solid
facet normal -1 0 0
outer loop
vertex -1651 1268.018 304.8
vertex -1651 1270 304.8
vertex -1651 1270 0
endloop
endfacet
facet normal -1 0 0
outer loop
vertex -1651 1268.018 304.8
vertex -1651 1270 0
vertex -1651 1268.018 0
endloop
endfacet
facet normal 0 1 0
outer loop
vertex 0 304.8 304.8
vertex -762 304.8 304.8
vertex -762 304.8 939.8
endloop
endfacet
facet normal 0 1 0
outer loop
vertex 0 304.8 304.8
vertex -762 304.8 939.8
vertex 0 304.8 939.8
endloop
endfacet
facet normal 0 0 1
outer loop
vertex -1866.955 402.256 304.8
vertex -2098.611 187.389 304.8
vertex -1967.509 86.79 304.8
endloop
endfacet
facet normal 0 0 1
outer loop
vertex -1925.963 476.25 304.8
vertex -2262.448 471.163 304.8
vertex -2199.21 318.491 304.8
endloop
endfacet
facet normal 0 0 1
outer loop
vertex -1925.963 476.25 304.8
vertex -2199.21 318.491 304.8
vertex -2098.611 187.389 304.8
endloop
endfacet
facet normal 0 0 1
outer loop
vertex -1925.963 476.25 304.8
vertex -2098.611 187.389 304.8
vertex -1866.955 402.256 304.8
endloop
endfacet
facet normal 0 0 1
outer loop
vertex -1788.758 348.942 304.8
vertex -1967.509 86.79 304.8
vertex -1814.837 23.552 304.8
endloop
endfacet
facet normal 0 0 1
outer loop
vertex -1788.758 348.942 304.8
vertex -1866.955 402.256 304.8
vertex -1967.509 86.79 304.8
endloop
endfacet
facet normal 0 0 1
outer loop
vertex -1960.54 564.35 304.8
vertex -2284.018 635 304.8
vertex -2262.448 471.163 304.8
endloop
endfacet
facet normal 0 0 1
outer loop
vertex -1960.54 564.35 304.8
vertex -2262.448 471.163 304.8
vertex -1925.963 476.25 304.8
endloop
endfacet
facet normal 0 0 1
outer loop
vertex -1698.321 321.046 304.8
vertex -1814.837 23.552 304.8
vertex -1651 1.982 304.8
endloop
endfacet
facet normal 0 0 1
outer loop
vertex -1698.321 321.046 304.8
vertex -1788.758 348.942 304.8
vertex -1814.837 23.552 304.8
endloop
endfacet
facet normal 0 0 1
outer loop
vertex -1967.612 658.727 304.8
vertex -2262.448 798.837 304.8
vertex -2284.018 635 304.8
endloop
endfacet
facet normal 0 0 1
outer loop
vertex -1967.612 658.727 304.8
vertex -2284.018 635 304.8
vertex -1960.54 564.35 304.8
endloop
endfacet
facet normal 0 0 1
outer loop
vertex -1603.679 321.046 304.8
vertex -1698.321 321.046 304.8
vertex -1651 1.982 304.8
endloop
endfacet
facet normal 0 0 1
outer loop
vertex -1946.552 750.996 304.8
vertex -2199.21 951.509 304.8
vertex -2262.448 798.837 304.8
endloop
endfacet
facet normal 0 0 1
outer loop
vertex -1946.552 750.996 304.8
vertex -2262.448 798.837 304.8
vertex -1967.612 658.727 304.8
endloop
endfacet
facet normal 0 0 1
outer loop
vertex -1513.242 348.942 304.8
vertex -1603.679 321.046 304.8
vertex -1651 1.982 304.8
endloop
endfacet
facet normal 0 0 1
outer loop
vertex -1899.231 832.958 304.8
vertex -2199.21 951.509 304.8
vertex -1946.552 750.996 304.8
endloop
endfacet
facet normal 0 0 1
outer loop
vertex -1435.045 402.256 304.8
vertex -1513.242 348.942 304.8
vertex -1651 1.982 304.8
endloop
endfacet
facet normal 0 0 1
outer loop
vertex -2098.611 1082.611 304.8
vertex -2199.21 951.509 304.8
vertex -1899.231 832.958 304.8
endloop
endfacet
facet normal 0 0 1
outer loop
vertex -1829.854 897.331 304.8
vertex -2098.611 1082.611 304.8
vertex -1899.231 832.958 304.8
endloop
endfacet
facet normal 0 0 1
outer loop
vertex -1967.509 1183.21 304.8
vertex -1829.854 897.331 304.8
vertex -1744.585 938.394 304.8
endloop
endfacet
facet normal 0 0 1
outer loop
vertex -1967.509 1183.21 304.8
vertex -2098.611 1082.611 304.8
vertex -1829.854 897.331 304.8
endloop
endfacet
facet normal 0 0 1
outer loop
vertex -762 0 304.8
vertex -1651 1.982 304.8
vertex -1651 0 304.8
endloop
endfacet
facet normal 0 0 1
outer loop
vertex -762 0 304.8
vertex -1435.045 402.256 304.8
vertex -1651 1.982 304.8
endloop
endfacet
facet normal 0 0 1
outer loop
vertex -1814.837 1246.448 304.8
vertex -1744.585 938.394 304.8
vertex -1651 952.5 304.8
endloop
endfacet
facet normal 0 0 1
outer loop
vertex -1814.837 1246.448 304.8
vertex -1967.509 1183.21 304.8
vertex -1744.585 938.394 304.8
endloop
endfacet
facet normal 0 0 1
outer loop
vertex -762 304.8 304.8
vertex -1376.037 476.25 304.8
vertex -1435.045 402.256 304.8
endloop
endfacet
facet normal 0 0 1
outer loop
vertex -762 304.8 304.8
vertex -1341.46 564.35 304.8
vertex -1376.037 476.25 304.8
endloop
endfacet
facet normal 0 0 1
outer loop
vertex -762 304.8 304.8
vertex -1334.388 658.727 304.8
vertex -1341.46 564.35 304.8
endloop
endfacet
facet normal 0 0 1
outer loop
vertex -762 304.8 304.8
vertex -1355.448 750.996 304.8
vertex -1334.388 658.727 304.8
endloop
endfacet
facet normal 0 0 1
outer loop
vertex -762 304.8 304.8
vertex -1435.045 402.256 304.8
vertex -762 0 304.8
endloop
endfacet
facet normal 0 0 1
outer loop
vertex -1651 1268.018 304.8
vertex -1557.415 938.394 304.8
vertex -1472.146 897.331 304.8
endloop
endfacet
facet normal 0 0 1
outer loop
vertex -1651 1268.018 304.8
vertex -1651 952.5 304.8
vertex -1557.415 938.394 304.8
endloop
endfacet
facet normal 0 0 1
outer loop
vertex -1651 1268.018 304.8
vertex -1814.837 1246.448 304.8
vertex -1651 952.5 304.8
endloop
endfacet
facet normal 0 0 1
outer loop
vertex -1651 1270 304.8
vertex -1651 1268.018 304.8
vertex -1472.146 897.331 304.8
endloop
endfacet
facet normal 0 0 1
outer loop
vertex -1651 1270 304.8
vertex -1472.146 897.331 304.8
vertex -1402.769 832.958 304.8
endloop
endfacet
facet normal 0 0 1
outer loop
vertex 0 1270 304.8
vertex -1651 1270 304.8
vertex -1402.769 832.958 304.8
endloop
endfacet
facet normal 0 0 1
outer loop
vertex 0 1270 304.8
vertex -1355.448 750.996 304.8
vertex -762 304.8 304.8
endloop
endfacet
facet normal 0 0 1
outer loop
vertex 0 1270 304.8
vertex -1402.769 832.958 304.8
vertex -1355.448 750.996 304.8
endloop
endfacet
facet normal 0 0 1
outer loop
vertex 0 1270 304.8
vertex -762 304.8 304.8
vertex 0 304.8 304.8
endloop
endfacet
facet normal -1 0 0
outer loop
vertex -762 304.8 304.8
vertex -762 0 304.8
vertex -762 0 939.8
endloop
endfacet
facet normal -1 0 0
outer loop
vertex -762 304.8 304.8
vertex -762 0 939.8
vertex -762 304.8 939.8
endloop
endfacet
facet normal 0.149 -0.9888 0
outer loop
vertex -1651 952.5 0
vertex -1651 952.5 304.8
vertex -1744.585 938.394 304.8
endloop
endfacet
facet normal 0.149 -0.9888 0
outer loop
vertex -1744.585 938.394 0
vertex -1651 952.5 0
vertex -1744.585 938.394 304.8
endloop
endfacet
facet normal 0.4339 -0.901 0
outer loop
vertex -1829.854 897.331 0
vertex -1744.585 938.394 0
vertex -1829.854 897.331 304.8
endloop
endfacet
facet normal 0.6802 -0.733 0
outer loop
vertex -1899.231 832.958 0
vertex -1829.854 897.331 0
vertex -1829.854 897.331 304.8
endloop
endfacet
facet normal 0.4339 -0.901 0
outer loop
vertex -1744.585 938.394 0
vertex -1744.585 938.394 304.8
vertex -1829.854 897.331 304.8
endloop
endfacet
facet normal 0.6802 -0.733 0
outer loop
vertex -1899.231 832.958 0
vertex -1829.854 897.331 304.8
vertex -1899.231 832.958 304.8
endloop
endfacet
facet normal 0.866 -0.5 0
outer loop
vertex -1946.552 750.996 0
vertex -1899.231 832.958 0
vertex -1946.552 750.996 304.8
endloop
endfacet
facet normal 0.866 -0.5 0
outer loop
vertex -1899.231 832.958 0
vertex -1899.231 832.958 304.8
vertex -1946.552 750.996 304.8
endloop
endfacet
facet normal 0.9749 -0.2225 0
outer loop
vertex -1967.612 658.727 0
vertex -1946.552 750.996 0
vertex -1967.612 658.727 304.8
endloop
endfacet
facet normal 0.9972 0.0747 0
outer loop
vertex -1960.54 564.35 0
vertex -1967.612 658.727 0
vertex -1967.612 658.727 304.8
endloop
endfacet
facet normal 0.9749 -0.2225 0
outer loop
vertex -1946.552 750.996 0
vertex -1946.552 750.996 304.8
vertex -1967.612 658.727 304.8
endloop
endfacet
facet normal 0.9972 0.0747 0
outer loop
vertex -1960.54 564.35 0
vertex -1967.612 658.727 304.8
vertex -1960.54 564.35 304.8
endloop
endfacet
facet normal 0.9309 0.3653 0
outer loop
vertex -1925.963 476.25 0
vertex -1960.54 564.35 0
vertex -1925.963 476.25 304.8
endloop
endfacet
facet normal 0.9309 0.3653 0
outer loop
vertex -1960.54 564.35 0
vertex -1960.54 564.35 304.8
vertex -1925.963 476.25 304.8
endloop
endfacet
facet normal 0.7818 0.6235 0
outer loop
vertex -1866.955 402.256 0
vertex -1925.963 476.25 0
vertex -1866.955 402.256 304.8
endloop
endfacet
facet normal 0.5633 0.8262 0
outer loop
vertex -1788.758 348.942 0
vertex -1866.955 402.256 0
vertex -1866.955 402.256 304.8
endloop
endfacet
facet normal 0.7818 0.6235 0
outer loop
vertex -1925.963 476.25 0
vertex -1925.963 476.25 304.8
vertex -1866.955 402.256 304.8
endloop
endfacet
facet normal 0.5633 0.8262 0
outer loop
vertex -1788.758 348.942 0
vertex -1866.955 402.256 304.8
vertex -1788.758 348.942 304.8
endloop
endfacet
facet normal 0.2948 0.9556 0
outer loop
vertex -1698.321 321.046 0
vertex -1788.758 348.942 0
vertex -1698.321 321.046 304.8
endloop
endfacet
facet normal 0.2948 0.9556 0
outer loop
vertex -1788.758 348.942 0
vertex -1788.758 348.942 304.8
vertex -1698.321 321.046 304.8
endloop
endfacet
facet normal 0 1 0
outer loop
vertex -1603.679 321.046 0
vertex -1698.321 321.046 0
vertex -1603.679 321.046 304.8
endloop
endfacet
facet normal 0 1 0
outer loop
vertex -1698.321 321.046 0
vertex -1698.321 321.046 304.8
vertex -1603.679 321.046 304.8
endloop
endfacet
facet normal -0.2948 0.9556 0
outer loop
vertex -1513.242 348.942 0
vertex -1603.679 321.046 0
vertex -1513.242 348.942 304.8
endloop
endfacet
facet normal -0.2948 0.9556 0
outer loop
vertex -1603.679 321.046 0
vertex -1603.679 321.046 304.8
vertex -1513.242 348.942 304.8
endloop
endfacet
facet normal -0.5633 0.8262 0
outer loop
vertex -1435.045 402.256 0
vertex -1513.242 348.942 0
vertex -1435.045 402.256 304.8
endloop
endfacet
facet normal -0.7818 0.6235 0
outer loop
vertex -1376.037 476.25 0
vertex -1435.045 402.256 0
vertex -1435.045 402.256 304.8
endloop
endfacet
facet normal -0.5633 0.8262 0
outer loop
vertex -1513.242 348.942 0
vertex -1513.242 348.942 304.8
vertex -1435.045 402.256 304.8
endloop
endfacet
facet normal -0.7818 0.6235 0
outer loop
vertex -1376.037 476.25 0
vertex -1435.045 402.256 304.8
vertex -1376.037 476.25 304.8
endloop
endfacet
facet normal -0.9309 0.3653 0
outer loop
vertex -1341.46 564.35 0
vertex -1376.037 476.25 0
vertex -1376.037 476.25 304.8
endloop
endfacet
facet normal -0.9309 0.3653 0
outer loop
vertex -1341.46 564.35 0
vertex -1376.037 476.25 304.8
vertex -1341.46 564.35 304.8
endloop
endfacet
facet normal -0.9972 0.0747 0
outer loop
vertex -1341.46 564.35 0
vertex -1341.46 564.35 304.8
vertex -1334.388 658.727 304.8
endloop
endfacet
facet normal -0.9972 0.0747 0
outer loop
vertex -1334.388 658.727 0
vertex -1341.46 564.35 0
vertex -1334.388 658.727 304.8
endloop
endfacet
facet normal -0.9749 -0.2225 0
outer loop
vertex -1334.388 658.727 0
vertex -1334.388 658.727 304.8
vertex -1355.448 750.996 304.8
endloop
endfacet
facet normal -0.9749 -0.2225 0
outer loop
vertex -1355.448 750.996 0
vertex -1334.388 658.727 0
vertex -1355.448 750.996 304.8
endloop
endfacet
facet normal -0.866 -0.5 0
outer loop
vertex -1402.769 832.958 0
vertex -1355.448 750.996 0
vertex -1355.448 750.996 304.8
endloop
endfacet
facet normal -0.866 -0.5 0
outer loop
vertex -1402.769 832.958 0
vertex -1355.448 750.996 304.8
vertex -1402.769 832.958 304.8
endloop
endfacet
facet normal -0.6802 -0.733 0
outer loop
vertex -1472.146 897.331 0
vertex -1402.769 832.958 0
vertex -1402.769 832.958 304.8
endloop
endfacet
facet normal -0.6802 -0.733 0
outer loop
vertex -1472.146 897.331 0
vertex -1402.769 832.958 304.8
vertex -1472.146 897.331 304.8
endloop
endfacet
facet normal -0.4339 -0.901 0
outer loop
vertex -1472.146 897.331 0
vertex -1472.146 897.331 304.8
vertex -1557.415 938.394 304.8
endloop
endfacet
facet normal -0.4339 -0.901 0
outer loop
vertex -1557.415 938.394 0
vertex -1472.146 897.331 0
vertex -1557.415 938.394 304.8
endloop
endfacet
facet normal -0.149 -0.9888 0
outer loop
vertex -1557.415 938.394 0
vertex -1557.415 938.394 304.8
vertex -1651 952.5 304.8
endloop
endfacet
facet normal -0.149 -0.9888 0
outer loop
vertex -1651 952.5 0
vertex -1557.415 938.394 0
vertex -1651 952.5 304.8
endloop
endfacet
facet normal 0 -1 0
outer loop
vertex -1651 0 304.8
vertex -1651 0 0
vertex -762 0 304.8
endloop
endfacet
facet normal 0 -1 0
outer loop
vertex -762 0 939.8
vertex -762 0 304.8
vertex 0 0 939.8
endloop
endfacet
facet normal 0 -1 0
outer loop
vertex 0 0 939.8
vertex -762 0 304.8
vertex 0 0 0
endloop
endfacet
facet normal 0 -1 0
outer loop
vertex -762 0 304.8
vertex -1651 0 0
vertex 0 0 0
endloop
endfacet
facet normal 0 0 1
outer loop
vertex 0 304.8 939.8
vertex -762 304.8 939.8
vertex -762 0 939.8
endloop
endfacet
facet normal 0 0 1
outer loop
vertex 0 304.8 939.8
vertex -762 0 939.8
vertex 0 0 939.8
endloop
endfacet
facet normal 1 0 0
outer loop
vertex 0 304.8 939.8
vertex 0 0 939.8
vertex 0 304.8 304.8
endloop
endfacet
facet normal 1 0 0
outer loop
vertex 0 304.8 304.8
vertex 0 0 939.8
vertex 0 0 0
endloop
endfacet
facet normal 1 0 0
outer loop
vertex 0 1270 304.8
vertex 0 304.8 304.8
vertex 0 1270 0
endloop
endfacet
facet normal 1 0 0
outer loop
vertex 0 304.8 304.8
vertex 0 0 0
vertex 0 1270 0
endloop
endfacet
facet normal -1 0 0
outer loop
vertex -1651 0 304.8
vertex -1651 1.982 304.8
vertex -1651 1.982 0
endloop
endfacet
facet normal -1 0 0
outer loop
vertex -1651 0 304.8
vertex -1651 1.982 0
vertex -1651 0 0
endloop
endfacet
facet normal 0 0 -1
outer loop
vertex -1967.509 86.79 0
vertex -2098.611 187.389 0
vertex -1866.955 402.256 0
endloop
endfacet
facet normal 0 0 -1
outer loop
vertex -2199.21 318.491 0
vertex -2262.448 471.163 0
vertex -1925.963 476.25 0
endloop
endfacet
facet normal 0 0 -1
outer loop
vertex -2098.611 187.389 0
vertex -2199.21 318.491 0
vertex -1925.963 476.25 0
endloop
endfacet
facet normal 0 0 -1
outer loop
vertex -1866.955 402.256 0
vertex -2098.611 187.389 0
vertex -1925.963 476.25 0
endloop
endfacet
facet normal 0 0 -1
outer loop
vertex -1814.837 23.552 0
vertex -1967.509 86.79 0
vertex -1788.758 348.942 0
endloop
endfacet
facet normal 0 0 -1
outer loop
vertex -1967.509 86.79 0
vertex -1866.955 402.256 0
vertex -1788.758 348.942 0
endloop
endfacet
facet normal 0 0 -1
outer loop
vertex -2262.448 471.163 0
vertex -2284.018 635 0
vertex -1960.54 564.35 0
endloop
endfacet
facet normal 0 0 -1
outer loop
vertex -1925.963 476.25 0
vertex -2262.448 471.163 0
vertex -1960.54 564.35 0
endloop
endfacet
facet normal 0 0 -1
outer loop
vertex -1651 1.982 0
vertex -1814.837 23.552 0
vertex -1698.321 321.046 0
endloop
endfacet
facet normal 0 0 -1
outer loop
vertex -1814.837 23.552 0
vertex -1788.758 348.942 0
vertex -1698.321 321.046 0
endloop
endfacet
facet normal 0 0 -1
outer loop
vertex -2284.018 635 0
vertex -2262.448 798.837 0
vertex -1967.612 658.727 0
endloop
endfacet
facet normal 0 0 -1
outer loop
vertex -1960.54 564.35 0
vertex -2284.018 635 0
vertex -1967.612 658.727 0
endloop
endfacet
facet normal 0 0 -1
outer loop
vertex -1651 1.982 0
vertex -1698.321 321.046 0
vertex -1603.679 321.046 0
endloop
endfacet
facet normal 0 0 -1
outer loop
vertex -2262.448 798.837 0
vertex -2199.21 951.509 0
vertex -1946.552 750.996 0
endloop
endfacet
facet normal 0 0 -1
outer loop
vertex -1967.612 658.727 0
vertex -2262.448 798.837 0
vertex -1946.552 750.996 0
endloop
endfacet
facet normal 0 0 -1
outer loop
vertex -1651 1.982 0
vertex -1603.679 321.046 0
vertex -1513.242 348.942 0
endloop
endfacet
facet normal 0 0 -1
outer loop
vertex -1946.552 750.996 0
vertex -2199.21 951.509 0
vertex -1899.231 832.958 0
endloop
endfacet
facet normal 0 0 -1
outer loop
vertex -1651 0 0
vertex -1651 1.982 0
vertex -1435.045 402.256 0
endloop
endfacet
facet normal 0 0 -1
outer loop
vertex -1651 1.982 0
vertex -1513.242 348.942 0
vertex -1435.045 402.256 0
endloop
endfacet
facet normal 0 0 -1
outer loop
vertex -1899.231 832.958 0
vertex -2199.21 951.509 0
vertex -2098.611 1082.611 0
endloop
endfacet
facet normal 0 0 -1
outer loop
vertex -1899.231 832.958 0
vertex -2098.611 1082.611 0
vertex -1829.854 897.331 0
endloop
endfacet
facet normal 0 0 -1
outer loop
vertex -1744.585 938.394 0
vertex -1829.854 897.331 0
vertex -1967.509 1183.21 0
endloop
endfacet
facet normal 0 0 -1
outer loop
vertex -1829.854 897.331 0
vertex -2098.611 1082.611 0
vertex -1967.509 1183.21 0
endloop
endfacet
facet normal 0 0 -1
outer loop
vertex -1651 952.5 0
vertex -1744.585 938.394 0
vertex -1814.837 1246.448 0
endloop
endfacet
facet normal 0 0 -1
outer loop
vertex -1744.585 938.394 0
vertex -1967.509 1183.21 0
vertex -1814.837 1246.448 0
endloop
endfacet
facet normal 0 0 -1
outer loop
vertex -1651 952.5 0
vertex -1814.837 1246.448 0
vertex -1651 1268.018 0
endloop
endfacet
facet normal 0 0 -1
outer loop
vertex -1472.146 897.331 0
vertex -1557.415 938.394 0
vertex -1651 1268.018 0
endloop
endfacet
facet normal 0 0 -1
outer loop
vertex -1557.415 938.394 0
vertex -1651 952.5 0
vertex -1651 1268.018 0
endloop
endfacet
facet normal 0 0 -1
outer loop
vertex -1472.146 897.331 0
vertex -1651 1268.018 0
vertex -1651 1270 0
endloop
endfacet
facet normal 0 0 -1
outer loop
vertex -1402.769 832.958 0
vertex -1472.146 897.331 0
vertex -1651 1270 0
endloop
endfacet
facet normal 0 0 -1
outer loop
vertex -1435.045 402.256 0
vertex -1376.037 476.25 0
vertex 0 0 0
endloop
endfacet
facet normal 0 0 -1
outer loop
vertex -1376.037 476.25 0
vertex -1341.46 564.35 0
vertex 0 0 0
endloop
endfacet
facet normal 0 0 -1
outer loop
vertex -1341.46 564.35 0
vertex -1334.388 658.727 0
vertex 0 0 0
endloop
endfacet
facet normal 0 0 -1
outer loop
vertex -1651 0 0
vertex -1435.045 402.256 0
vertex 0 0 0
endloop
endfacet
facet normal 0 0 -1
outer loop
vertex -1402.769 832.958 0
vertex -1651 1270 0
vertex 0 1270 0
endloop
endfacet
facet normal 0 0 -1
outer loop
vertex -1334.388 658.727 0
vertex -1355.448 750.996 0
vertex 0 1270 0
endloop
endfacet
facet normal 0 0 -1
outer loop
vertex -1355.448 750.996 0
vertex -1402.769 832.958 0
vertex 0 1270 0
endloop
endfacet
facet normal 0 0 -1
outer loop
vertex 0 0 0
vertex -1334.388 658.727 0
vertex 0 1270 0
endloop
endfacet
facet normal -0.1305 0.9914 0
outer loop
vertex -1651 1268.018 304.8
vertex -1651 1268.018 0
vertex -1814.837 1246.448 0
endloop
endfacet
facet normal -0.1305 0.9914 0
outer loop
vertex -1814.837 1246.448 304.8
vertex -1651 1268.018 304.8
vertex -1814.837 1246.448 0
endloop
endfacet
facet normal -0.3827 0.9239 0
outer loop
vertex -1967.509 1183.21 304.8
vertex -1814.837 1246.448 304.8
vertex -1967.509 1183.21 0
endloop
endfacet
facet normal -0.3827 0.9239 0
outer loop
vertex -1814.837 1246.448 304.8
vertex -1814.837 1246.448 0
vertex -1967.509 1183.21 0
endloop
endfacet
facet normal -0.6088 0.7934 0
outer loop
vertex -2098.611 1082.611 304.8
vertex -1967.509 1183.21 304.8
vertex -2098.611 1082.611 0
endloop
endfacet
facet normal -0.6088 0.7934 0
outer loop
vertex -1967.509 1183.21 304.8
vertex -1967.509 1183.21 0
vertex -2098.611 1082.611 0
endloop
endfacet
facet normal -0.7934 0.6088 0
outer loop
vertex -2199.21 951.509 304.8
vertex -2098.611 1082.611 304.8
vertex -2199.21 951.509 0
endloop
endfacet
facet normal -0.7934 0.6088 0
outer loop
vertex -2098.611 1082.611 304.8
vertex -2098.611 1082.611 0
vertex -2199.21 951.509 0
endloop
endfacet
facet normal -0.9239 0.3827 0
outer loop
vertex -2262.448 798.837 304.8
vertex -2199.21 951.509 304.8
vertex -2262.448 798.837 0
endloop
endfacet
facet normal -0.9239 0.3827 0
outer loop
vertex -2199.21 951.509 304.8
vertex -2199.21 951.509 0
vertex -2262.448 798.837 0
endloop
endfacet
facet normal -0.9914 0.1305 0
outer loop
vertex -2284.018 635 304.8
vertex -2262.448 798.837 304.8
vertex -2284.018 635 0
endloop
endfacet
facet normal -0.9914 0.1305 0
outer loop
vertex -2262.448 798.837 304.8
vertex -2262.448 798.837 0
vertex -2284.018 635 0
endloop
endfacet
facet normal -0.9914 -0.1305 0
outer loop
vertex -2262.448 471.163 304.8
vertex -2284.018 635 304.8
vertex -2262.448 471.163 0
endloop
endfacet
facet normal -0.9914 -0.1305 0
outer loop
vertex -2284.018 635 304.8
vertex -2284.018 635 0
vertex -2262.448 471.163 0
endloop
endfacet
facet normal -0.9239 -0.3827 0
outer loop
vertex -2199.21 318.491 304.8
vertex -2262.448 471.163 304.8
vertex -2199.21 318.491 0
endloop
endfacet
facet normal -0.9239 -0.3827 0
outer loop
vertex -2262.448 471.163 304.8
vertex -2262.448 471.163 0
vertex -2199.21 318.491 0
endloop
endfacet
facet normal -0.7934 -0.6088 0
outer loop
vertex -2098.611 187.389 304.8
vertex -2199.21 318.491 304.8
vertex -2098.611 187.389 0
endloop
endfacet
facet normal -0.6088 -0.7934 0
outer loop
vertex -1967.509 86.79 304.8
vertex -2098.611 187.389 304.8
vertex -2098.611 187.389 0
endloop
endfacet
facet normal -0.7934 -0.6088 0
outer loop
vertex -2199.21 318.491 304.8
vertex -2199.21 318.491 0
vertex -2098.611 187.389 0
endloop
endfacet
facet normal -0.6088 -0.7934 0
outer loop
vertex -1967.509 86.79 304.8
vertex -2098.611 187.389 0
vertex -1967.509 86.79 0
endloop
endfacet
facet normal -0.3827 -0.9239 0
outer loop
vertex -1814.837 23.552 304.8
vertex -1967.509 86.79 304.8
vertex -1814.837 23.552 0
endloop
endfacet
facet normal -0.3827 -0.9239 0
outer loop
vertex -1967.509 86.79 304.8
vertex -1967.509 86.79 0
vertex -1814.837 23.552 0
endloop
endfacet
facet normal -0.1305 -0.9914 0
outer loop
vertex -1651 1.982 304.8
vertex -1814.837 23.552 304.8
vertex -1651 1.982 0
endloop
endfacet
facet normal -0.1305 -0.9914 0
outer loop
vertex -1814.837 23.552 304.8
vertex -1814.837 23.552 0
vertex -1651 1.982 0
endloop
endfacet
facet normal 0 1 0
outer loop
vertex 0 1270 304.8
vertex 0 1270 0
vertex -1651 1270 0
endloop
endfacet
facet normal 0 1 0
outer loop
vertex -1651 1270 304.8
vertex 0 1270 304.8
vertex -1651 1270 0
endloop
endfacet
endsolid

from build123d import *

# Parameters (mm, degrees)
F1_DEPTH = 304.8
F3_DEPTH = 2540
F4_W     = 762
F4_H     = 304.8
F5_DEPTH = 635


with BuildPart() as f1:
    # F0 (on Top) → F1 (new body)
    with BuildSketch(Plane.XY):
        with BuildLine():
            Line((-1651, 0), (0, 0))
            Line((0, 0), (0, 1270))
            Line((0, 1270), (-1651, 1270))
            Line((-1651, 1270), (-1651, 1268.0179134988))
            ThreePointArc((-1651, 1268.0179134988), (-1203.3887407525, 1082.6112592476), (-1017.9820865012, 635))
            ThreePointArc((-1017.9820865012, 635), (-1203.3887407525, 187.3887407524), (-1651, 1.9820865012))
            Line((-1651, 1.9820865012), (-1651, 0))
        make_face()
        with BuildLine():
            ThreePointArc((-1651, 1268.0179134988), (-2284.0179134988, 635), (-1651, 1.9820865012))
            Line((-1651, 1.9820865012), (-1651, 1268.0179134988))
        make_face()
        with BuildLine():
            Line((-1651, 1268.0179134988), (-1651, 1.9820865012))
            ThreePointArc((-1651, 1.9820865012), (-1203.3887407525, 187.3887407524), (-1017.9820865012, 635))
            ThreePointArc((-1017.9820865012, 635), (-1203.3887407525, 1082.6112592476), (-1651, 1268.0179134988))
        make_face()
    extrude(amount=F1_DEPTH)

    # F2 (on face) → F3 (cut)
    with BuildSketch(Plane.XY.offset(304.8)):
        with BuildLine():
            ThreePointArc((-1333.5, 635), (-1426.4935969733, 859.5064030267), (-1651, 952.5))
            Line((-1651, 952.5), (-1651, 317.5))
            ThreePointArc((-1651, 317.5), (-1426.4935969733, 410.4935969733), (-1333.5, 635))
        make_face()
        with BuildLine():
            Line((-1651, 317.5), (-1651, 952.5))
            ThreePointArc((-1651, 952.5), (-1968.5, 635), (-1651, 317.5))
        make_face()
    extrude(amount=-F3_DEPTH, mode=Mode.SUBTRACT)

    # F4 (on face) → F5 (join)
    with BuildSketch(Plane.XY.offset(304.8)):
        with Locations((-381, 152.4)):
            Rectangle(F4_W, F4_H)
    extrude(amount=F5_DEPTH)


solid = f1.part
